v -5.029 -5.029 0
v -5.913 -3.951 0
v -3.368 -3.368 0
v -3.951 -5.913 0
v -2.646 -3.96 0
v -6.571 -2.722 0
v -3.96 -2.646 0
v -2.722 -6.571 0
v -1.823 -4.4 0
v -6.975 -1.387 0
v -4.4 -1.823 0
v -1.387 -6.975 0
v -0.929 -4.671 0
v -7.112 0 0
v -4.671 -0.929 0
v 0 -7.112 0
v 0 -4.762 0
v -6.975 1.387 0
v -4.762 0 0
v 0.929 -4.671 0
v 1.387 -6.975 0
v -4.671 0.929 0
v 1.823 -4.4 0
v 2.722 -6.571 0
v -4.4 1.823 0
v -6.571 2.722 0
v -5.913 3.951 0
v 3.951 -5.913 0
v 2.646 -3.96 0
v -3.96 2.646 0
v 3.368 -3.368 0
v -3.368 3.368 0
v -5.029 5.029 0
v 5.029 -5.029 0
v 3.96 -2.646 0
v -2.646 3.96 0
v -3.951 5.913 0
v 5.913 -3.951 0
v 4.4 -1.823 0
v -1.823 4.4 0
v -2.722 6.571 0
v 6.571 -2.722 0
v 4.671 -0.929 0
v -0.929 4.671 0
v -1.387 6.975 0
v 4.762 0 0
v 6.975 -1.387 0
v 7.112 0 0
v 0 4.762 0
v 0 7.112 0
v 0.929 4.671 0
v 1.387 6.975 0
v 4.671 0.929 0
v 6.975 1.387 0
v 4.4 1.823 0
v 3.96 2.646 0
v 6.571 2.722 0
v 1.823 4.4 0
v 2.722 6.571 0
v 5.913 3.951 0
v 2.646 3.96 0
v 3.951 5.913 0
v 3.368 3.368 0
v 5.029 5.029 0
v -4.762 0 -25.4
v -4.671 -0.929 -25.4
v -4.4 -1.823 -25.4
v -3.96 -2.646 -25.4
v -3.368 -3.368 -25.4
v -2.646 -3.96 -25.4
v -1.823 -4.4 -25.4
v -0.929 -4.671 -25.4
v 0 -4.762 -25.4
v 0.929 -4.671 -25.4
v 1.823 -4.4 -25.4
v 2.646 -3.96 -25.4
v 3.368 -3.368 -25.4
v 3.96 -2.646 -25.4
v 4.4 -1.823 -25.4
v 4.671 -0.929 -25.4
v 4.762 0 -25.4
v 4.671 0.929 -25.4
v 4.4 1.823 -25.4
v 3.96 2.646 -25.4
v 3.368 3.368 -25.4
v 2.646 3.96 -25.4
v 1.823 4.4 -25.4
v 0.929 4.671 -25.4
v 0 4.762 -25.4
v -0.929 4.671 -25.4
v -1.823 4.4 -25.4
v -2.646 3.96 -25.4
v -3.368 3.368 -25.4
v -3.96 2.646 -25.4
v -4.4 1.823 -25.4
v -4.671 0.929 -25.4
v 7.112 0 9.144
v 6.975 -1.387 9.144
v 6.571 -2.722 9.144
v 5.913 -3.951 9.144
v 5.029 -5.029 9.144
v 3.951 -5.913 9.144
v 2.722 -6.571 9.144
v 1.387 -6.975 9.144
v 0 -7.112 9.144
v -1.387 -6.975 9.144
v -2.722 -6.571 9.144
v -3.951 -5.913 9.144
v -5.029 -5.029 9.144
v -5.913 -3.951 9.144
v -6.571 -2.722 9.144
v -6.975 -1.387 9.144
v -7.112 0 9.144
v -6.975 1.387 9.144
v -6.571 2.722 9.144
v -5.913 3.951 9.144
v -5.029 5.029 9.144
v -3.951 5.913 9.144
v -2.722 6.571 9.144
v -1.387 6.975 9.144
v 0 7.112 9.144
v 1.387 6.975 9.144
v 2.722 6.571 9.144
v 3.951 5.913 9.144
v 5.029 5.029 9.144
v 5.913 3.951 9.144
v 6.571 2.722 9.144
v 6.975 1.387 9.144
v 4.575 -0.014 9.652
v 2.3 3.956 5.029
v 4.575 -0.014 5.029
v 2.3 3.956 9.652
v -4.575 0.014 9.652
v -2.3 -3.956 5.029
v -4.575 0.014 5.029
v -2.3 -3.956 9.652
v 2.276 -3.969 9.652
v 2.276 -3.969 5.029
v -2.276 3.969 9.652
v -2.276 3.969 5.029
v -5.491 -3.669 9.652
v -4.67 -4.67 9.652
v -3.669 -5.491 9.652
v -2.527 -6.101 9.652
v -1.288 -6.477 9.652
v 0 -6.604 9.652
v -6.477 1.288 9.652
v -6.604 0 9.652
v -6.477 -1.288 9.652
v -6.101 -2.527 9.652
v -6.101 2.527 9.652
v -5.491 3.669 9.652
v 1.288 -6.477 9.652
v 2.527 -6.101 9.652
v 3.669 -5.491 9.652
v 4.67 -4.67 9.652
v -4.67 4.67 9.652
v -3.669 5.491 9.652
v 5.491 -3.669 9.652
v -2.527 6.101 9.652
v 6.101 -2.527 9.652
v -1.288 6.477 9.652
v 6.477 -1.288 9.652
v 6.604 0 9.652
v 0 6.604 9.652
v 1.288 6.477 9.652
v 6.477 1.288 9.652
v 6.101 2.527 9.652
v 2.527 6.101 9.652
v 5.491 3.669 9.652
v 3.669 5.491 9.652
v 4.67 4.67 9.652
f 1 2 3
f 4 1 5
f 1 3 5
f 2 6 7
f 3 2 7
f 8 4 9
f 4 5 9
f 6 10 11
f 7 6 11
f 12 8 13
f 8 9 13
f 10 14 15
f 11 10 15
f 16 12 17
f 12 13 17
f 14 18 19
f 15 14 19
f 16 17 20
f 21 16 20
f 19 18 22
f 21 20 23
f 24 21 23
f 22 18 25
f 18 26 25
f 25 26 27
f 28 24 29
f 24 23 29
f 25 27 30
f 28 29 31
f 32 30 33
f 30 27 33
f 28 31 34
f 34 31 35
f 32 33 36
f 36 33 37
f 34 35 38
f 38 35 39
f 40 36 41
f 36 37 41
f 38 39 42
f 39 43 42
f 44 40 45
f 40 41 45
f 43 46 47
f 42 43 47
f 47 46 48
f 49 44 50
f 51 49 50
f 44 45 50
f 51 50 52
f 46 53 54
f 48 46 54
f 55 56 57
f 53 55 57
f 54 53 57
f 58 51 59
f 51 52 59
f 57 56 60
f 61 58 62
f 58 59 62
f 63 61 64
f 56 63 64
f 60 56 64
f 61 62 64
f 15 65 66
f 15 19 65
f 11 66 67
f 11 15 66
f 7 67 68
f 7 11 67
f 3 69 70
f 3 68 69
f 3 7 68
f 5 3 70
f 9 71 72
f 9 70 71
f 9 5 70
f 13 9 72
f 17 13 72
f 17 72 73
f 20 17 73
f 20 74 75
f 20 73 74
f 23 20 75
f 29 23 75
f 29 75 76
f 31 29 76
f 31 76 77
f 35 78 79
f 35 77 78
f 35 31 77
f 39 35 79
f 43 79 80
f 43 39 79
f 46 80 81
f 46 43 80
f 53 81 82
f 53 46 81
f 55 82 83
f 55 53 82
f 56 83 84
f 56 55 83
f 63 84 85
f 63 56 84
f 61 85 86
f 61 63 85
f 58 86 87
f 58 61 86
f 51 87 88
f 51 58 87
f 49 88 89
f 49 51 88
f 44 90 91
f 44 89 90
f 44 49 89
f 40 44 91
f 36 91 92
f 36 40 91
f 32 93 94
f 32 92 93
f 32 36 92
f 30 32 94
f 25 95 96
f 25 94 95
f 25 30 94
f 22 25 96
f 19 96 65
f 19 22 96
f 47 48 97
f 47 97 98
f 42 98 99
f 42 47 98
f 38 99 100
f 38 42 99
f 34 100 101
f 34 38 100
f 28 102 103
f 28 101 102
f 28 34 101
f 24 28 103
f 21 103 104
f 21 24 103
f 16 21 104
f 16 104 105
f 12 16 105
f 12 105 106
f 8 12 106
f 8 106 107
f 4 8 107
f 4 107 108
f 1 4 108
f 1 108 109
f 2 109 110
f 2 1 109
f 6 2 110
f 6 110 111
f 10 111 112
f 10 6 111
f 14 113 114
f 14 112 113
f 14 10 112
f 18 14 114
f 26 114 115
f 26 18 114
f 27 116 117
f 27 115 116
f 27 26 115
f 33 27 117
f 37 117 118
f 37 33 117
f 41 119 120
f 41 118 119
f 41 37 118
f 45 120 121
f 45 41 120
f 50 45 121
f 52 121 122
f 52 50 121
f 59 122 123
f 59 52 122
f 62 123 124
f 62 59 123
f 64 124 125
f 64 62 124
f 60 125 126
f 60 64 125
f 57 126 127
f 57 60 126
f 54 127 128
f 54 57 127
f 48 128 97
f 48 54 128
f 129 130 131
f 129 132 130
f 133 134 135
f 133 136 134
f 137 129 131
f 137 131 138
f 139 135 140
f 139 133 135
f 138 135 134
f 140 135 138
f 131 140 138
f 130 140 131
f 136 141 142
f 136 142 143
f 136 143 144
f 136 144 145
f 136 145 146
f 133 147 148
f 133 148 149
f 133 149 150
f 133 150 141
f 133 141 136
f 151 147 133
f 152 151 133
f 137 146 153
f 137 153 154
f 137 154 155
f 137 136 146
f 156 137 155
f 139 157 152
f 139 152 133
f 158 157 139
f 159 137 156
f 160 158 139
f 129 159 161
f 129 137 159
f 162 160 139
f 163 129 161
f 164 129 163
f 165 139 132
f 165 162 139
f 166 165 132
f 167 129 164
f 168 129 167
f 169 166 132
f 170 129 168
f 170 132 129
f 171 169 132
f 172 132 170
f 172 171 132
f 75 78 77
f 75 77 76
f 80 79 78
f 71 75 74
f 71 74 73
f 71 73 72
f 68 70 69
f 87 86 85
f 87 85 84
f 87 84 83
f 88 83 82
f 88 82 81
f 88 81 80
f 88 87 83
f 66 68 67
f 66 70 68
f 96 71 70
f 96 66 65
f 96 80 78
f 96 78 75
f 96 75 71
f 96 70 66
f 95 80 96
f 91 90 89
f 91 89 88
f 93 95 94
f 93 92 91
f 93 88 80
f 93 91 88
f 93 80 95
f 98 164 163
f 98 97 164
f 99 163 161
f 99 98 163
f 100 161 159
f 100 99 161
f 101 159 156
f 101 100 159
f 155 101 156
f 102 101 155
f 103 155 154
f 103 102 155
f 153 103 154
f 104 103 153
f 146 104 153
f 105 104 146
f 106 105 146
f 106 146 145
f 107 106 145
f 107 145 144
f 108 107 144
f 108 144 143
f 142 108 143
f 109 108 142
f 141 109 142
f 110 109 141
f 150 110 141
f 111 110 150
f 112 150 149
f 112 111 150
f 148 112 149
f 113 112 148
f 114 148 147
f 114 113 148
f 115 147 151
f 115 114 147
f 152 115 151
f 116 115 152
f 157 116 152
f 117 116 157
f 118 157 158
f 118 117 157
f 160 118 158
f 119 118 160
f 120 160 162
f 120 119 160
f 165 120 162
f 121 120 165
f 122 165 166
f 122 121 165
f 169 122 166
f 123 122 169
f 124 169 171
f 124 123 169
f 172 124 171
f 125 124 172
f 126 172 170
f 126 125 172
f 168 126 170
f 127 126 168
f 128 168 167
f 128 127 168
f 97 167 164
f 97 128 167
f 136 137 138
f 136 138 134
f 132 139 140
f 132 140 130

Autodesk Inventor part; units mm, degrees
ref_plane "YZ Plane" through (0, 0, 0) normal (1, 0, 0) x (0, 1, 0)
ref_plane "XZ Plane" through (0, 0, 0) normal (0, 1, 0) x (-1, 0, 0)
ref_plane "XY Plane" through (0, 0, 0) normal (0, 0, 1) x (1, 0, 0)
sketch "Sketch1" plane through (0, 0, 0) normal (0, 0, 1) x (1, 0, 0)
  circle A0 centre (0, 0) radius 7.112
  dimension "d0" = 14.224
extrude "Extrusion1" add sketch "Sketch1" along normal blind 9.652
sketch "Sketch2" plane through (0, 0, 9.652) normal (0, 0, 1) x (1, 0, 0)
  line L0 (2.2997, 3.9555) -> (4.5754, -0.0139)
  line L1 (4.5754, -0.0139) -> (2.2757, -3.9693)
  line L2 (2.2757, -3.9693) -> (-2.2997, -3.9555)
  line L3 (-2.2997, -3.9555) -> (-4.5754, 0.0139)
  line L4 (-4.5754, 0.0139) -> (-2.2757, 3.9693)
  line L5 (-2.2757, 3.9693) -> (2.2997, 3.9555)
  point P0 (0, 0)
  point P1 (0, 0)
  dimension "d3" = 7.9248
extrude "Extrusion2" cut sketch "Sketch2" against normal blind 4.6228
chamfer "Chamfer1" distance 0.508 angle 45 1 edges at (-7.112, 0, 9.652)
sketch "Sketch3" plane through (0, 0, 0) normal (0, 0, -1) x (-1, 0, 0)
  circle A0 centre (0, 0) radius 4.7625
  dimension "d9" = 9.525
extrude "Extrusion3" add sketch "Sketch3" along normal blind 25.4
thread "Thread1" size "3/8-16 UNC" class "2A" standard "ANSI Unified Screw Threads" full length
properties part number "3-8-16 UNC Bolt" material "Stainless Steel"
